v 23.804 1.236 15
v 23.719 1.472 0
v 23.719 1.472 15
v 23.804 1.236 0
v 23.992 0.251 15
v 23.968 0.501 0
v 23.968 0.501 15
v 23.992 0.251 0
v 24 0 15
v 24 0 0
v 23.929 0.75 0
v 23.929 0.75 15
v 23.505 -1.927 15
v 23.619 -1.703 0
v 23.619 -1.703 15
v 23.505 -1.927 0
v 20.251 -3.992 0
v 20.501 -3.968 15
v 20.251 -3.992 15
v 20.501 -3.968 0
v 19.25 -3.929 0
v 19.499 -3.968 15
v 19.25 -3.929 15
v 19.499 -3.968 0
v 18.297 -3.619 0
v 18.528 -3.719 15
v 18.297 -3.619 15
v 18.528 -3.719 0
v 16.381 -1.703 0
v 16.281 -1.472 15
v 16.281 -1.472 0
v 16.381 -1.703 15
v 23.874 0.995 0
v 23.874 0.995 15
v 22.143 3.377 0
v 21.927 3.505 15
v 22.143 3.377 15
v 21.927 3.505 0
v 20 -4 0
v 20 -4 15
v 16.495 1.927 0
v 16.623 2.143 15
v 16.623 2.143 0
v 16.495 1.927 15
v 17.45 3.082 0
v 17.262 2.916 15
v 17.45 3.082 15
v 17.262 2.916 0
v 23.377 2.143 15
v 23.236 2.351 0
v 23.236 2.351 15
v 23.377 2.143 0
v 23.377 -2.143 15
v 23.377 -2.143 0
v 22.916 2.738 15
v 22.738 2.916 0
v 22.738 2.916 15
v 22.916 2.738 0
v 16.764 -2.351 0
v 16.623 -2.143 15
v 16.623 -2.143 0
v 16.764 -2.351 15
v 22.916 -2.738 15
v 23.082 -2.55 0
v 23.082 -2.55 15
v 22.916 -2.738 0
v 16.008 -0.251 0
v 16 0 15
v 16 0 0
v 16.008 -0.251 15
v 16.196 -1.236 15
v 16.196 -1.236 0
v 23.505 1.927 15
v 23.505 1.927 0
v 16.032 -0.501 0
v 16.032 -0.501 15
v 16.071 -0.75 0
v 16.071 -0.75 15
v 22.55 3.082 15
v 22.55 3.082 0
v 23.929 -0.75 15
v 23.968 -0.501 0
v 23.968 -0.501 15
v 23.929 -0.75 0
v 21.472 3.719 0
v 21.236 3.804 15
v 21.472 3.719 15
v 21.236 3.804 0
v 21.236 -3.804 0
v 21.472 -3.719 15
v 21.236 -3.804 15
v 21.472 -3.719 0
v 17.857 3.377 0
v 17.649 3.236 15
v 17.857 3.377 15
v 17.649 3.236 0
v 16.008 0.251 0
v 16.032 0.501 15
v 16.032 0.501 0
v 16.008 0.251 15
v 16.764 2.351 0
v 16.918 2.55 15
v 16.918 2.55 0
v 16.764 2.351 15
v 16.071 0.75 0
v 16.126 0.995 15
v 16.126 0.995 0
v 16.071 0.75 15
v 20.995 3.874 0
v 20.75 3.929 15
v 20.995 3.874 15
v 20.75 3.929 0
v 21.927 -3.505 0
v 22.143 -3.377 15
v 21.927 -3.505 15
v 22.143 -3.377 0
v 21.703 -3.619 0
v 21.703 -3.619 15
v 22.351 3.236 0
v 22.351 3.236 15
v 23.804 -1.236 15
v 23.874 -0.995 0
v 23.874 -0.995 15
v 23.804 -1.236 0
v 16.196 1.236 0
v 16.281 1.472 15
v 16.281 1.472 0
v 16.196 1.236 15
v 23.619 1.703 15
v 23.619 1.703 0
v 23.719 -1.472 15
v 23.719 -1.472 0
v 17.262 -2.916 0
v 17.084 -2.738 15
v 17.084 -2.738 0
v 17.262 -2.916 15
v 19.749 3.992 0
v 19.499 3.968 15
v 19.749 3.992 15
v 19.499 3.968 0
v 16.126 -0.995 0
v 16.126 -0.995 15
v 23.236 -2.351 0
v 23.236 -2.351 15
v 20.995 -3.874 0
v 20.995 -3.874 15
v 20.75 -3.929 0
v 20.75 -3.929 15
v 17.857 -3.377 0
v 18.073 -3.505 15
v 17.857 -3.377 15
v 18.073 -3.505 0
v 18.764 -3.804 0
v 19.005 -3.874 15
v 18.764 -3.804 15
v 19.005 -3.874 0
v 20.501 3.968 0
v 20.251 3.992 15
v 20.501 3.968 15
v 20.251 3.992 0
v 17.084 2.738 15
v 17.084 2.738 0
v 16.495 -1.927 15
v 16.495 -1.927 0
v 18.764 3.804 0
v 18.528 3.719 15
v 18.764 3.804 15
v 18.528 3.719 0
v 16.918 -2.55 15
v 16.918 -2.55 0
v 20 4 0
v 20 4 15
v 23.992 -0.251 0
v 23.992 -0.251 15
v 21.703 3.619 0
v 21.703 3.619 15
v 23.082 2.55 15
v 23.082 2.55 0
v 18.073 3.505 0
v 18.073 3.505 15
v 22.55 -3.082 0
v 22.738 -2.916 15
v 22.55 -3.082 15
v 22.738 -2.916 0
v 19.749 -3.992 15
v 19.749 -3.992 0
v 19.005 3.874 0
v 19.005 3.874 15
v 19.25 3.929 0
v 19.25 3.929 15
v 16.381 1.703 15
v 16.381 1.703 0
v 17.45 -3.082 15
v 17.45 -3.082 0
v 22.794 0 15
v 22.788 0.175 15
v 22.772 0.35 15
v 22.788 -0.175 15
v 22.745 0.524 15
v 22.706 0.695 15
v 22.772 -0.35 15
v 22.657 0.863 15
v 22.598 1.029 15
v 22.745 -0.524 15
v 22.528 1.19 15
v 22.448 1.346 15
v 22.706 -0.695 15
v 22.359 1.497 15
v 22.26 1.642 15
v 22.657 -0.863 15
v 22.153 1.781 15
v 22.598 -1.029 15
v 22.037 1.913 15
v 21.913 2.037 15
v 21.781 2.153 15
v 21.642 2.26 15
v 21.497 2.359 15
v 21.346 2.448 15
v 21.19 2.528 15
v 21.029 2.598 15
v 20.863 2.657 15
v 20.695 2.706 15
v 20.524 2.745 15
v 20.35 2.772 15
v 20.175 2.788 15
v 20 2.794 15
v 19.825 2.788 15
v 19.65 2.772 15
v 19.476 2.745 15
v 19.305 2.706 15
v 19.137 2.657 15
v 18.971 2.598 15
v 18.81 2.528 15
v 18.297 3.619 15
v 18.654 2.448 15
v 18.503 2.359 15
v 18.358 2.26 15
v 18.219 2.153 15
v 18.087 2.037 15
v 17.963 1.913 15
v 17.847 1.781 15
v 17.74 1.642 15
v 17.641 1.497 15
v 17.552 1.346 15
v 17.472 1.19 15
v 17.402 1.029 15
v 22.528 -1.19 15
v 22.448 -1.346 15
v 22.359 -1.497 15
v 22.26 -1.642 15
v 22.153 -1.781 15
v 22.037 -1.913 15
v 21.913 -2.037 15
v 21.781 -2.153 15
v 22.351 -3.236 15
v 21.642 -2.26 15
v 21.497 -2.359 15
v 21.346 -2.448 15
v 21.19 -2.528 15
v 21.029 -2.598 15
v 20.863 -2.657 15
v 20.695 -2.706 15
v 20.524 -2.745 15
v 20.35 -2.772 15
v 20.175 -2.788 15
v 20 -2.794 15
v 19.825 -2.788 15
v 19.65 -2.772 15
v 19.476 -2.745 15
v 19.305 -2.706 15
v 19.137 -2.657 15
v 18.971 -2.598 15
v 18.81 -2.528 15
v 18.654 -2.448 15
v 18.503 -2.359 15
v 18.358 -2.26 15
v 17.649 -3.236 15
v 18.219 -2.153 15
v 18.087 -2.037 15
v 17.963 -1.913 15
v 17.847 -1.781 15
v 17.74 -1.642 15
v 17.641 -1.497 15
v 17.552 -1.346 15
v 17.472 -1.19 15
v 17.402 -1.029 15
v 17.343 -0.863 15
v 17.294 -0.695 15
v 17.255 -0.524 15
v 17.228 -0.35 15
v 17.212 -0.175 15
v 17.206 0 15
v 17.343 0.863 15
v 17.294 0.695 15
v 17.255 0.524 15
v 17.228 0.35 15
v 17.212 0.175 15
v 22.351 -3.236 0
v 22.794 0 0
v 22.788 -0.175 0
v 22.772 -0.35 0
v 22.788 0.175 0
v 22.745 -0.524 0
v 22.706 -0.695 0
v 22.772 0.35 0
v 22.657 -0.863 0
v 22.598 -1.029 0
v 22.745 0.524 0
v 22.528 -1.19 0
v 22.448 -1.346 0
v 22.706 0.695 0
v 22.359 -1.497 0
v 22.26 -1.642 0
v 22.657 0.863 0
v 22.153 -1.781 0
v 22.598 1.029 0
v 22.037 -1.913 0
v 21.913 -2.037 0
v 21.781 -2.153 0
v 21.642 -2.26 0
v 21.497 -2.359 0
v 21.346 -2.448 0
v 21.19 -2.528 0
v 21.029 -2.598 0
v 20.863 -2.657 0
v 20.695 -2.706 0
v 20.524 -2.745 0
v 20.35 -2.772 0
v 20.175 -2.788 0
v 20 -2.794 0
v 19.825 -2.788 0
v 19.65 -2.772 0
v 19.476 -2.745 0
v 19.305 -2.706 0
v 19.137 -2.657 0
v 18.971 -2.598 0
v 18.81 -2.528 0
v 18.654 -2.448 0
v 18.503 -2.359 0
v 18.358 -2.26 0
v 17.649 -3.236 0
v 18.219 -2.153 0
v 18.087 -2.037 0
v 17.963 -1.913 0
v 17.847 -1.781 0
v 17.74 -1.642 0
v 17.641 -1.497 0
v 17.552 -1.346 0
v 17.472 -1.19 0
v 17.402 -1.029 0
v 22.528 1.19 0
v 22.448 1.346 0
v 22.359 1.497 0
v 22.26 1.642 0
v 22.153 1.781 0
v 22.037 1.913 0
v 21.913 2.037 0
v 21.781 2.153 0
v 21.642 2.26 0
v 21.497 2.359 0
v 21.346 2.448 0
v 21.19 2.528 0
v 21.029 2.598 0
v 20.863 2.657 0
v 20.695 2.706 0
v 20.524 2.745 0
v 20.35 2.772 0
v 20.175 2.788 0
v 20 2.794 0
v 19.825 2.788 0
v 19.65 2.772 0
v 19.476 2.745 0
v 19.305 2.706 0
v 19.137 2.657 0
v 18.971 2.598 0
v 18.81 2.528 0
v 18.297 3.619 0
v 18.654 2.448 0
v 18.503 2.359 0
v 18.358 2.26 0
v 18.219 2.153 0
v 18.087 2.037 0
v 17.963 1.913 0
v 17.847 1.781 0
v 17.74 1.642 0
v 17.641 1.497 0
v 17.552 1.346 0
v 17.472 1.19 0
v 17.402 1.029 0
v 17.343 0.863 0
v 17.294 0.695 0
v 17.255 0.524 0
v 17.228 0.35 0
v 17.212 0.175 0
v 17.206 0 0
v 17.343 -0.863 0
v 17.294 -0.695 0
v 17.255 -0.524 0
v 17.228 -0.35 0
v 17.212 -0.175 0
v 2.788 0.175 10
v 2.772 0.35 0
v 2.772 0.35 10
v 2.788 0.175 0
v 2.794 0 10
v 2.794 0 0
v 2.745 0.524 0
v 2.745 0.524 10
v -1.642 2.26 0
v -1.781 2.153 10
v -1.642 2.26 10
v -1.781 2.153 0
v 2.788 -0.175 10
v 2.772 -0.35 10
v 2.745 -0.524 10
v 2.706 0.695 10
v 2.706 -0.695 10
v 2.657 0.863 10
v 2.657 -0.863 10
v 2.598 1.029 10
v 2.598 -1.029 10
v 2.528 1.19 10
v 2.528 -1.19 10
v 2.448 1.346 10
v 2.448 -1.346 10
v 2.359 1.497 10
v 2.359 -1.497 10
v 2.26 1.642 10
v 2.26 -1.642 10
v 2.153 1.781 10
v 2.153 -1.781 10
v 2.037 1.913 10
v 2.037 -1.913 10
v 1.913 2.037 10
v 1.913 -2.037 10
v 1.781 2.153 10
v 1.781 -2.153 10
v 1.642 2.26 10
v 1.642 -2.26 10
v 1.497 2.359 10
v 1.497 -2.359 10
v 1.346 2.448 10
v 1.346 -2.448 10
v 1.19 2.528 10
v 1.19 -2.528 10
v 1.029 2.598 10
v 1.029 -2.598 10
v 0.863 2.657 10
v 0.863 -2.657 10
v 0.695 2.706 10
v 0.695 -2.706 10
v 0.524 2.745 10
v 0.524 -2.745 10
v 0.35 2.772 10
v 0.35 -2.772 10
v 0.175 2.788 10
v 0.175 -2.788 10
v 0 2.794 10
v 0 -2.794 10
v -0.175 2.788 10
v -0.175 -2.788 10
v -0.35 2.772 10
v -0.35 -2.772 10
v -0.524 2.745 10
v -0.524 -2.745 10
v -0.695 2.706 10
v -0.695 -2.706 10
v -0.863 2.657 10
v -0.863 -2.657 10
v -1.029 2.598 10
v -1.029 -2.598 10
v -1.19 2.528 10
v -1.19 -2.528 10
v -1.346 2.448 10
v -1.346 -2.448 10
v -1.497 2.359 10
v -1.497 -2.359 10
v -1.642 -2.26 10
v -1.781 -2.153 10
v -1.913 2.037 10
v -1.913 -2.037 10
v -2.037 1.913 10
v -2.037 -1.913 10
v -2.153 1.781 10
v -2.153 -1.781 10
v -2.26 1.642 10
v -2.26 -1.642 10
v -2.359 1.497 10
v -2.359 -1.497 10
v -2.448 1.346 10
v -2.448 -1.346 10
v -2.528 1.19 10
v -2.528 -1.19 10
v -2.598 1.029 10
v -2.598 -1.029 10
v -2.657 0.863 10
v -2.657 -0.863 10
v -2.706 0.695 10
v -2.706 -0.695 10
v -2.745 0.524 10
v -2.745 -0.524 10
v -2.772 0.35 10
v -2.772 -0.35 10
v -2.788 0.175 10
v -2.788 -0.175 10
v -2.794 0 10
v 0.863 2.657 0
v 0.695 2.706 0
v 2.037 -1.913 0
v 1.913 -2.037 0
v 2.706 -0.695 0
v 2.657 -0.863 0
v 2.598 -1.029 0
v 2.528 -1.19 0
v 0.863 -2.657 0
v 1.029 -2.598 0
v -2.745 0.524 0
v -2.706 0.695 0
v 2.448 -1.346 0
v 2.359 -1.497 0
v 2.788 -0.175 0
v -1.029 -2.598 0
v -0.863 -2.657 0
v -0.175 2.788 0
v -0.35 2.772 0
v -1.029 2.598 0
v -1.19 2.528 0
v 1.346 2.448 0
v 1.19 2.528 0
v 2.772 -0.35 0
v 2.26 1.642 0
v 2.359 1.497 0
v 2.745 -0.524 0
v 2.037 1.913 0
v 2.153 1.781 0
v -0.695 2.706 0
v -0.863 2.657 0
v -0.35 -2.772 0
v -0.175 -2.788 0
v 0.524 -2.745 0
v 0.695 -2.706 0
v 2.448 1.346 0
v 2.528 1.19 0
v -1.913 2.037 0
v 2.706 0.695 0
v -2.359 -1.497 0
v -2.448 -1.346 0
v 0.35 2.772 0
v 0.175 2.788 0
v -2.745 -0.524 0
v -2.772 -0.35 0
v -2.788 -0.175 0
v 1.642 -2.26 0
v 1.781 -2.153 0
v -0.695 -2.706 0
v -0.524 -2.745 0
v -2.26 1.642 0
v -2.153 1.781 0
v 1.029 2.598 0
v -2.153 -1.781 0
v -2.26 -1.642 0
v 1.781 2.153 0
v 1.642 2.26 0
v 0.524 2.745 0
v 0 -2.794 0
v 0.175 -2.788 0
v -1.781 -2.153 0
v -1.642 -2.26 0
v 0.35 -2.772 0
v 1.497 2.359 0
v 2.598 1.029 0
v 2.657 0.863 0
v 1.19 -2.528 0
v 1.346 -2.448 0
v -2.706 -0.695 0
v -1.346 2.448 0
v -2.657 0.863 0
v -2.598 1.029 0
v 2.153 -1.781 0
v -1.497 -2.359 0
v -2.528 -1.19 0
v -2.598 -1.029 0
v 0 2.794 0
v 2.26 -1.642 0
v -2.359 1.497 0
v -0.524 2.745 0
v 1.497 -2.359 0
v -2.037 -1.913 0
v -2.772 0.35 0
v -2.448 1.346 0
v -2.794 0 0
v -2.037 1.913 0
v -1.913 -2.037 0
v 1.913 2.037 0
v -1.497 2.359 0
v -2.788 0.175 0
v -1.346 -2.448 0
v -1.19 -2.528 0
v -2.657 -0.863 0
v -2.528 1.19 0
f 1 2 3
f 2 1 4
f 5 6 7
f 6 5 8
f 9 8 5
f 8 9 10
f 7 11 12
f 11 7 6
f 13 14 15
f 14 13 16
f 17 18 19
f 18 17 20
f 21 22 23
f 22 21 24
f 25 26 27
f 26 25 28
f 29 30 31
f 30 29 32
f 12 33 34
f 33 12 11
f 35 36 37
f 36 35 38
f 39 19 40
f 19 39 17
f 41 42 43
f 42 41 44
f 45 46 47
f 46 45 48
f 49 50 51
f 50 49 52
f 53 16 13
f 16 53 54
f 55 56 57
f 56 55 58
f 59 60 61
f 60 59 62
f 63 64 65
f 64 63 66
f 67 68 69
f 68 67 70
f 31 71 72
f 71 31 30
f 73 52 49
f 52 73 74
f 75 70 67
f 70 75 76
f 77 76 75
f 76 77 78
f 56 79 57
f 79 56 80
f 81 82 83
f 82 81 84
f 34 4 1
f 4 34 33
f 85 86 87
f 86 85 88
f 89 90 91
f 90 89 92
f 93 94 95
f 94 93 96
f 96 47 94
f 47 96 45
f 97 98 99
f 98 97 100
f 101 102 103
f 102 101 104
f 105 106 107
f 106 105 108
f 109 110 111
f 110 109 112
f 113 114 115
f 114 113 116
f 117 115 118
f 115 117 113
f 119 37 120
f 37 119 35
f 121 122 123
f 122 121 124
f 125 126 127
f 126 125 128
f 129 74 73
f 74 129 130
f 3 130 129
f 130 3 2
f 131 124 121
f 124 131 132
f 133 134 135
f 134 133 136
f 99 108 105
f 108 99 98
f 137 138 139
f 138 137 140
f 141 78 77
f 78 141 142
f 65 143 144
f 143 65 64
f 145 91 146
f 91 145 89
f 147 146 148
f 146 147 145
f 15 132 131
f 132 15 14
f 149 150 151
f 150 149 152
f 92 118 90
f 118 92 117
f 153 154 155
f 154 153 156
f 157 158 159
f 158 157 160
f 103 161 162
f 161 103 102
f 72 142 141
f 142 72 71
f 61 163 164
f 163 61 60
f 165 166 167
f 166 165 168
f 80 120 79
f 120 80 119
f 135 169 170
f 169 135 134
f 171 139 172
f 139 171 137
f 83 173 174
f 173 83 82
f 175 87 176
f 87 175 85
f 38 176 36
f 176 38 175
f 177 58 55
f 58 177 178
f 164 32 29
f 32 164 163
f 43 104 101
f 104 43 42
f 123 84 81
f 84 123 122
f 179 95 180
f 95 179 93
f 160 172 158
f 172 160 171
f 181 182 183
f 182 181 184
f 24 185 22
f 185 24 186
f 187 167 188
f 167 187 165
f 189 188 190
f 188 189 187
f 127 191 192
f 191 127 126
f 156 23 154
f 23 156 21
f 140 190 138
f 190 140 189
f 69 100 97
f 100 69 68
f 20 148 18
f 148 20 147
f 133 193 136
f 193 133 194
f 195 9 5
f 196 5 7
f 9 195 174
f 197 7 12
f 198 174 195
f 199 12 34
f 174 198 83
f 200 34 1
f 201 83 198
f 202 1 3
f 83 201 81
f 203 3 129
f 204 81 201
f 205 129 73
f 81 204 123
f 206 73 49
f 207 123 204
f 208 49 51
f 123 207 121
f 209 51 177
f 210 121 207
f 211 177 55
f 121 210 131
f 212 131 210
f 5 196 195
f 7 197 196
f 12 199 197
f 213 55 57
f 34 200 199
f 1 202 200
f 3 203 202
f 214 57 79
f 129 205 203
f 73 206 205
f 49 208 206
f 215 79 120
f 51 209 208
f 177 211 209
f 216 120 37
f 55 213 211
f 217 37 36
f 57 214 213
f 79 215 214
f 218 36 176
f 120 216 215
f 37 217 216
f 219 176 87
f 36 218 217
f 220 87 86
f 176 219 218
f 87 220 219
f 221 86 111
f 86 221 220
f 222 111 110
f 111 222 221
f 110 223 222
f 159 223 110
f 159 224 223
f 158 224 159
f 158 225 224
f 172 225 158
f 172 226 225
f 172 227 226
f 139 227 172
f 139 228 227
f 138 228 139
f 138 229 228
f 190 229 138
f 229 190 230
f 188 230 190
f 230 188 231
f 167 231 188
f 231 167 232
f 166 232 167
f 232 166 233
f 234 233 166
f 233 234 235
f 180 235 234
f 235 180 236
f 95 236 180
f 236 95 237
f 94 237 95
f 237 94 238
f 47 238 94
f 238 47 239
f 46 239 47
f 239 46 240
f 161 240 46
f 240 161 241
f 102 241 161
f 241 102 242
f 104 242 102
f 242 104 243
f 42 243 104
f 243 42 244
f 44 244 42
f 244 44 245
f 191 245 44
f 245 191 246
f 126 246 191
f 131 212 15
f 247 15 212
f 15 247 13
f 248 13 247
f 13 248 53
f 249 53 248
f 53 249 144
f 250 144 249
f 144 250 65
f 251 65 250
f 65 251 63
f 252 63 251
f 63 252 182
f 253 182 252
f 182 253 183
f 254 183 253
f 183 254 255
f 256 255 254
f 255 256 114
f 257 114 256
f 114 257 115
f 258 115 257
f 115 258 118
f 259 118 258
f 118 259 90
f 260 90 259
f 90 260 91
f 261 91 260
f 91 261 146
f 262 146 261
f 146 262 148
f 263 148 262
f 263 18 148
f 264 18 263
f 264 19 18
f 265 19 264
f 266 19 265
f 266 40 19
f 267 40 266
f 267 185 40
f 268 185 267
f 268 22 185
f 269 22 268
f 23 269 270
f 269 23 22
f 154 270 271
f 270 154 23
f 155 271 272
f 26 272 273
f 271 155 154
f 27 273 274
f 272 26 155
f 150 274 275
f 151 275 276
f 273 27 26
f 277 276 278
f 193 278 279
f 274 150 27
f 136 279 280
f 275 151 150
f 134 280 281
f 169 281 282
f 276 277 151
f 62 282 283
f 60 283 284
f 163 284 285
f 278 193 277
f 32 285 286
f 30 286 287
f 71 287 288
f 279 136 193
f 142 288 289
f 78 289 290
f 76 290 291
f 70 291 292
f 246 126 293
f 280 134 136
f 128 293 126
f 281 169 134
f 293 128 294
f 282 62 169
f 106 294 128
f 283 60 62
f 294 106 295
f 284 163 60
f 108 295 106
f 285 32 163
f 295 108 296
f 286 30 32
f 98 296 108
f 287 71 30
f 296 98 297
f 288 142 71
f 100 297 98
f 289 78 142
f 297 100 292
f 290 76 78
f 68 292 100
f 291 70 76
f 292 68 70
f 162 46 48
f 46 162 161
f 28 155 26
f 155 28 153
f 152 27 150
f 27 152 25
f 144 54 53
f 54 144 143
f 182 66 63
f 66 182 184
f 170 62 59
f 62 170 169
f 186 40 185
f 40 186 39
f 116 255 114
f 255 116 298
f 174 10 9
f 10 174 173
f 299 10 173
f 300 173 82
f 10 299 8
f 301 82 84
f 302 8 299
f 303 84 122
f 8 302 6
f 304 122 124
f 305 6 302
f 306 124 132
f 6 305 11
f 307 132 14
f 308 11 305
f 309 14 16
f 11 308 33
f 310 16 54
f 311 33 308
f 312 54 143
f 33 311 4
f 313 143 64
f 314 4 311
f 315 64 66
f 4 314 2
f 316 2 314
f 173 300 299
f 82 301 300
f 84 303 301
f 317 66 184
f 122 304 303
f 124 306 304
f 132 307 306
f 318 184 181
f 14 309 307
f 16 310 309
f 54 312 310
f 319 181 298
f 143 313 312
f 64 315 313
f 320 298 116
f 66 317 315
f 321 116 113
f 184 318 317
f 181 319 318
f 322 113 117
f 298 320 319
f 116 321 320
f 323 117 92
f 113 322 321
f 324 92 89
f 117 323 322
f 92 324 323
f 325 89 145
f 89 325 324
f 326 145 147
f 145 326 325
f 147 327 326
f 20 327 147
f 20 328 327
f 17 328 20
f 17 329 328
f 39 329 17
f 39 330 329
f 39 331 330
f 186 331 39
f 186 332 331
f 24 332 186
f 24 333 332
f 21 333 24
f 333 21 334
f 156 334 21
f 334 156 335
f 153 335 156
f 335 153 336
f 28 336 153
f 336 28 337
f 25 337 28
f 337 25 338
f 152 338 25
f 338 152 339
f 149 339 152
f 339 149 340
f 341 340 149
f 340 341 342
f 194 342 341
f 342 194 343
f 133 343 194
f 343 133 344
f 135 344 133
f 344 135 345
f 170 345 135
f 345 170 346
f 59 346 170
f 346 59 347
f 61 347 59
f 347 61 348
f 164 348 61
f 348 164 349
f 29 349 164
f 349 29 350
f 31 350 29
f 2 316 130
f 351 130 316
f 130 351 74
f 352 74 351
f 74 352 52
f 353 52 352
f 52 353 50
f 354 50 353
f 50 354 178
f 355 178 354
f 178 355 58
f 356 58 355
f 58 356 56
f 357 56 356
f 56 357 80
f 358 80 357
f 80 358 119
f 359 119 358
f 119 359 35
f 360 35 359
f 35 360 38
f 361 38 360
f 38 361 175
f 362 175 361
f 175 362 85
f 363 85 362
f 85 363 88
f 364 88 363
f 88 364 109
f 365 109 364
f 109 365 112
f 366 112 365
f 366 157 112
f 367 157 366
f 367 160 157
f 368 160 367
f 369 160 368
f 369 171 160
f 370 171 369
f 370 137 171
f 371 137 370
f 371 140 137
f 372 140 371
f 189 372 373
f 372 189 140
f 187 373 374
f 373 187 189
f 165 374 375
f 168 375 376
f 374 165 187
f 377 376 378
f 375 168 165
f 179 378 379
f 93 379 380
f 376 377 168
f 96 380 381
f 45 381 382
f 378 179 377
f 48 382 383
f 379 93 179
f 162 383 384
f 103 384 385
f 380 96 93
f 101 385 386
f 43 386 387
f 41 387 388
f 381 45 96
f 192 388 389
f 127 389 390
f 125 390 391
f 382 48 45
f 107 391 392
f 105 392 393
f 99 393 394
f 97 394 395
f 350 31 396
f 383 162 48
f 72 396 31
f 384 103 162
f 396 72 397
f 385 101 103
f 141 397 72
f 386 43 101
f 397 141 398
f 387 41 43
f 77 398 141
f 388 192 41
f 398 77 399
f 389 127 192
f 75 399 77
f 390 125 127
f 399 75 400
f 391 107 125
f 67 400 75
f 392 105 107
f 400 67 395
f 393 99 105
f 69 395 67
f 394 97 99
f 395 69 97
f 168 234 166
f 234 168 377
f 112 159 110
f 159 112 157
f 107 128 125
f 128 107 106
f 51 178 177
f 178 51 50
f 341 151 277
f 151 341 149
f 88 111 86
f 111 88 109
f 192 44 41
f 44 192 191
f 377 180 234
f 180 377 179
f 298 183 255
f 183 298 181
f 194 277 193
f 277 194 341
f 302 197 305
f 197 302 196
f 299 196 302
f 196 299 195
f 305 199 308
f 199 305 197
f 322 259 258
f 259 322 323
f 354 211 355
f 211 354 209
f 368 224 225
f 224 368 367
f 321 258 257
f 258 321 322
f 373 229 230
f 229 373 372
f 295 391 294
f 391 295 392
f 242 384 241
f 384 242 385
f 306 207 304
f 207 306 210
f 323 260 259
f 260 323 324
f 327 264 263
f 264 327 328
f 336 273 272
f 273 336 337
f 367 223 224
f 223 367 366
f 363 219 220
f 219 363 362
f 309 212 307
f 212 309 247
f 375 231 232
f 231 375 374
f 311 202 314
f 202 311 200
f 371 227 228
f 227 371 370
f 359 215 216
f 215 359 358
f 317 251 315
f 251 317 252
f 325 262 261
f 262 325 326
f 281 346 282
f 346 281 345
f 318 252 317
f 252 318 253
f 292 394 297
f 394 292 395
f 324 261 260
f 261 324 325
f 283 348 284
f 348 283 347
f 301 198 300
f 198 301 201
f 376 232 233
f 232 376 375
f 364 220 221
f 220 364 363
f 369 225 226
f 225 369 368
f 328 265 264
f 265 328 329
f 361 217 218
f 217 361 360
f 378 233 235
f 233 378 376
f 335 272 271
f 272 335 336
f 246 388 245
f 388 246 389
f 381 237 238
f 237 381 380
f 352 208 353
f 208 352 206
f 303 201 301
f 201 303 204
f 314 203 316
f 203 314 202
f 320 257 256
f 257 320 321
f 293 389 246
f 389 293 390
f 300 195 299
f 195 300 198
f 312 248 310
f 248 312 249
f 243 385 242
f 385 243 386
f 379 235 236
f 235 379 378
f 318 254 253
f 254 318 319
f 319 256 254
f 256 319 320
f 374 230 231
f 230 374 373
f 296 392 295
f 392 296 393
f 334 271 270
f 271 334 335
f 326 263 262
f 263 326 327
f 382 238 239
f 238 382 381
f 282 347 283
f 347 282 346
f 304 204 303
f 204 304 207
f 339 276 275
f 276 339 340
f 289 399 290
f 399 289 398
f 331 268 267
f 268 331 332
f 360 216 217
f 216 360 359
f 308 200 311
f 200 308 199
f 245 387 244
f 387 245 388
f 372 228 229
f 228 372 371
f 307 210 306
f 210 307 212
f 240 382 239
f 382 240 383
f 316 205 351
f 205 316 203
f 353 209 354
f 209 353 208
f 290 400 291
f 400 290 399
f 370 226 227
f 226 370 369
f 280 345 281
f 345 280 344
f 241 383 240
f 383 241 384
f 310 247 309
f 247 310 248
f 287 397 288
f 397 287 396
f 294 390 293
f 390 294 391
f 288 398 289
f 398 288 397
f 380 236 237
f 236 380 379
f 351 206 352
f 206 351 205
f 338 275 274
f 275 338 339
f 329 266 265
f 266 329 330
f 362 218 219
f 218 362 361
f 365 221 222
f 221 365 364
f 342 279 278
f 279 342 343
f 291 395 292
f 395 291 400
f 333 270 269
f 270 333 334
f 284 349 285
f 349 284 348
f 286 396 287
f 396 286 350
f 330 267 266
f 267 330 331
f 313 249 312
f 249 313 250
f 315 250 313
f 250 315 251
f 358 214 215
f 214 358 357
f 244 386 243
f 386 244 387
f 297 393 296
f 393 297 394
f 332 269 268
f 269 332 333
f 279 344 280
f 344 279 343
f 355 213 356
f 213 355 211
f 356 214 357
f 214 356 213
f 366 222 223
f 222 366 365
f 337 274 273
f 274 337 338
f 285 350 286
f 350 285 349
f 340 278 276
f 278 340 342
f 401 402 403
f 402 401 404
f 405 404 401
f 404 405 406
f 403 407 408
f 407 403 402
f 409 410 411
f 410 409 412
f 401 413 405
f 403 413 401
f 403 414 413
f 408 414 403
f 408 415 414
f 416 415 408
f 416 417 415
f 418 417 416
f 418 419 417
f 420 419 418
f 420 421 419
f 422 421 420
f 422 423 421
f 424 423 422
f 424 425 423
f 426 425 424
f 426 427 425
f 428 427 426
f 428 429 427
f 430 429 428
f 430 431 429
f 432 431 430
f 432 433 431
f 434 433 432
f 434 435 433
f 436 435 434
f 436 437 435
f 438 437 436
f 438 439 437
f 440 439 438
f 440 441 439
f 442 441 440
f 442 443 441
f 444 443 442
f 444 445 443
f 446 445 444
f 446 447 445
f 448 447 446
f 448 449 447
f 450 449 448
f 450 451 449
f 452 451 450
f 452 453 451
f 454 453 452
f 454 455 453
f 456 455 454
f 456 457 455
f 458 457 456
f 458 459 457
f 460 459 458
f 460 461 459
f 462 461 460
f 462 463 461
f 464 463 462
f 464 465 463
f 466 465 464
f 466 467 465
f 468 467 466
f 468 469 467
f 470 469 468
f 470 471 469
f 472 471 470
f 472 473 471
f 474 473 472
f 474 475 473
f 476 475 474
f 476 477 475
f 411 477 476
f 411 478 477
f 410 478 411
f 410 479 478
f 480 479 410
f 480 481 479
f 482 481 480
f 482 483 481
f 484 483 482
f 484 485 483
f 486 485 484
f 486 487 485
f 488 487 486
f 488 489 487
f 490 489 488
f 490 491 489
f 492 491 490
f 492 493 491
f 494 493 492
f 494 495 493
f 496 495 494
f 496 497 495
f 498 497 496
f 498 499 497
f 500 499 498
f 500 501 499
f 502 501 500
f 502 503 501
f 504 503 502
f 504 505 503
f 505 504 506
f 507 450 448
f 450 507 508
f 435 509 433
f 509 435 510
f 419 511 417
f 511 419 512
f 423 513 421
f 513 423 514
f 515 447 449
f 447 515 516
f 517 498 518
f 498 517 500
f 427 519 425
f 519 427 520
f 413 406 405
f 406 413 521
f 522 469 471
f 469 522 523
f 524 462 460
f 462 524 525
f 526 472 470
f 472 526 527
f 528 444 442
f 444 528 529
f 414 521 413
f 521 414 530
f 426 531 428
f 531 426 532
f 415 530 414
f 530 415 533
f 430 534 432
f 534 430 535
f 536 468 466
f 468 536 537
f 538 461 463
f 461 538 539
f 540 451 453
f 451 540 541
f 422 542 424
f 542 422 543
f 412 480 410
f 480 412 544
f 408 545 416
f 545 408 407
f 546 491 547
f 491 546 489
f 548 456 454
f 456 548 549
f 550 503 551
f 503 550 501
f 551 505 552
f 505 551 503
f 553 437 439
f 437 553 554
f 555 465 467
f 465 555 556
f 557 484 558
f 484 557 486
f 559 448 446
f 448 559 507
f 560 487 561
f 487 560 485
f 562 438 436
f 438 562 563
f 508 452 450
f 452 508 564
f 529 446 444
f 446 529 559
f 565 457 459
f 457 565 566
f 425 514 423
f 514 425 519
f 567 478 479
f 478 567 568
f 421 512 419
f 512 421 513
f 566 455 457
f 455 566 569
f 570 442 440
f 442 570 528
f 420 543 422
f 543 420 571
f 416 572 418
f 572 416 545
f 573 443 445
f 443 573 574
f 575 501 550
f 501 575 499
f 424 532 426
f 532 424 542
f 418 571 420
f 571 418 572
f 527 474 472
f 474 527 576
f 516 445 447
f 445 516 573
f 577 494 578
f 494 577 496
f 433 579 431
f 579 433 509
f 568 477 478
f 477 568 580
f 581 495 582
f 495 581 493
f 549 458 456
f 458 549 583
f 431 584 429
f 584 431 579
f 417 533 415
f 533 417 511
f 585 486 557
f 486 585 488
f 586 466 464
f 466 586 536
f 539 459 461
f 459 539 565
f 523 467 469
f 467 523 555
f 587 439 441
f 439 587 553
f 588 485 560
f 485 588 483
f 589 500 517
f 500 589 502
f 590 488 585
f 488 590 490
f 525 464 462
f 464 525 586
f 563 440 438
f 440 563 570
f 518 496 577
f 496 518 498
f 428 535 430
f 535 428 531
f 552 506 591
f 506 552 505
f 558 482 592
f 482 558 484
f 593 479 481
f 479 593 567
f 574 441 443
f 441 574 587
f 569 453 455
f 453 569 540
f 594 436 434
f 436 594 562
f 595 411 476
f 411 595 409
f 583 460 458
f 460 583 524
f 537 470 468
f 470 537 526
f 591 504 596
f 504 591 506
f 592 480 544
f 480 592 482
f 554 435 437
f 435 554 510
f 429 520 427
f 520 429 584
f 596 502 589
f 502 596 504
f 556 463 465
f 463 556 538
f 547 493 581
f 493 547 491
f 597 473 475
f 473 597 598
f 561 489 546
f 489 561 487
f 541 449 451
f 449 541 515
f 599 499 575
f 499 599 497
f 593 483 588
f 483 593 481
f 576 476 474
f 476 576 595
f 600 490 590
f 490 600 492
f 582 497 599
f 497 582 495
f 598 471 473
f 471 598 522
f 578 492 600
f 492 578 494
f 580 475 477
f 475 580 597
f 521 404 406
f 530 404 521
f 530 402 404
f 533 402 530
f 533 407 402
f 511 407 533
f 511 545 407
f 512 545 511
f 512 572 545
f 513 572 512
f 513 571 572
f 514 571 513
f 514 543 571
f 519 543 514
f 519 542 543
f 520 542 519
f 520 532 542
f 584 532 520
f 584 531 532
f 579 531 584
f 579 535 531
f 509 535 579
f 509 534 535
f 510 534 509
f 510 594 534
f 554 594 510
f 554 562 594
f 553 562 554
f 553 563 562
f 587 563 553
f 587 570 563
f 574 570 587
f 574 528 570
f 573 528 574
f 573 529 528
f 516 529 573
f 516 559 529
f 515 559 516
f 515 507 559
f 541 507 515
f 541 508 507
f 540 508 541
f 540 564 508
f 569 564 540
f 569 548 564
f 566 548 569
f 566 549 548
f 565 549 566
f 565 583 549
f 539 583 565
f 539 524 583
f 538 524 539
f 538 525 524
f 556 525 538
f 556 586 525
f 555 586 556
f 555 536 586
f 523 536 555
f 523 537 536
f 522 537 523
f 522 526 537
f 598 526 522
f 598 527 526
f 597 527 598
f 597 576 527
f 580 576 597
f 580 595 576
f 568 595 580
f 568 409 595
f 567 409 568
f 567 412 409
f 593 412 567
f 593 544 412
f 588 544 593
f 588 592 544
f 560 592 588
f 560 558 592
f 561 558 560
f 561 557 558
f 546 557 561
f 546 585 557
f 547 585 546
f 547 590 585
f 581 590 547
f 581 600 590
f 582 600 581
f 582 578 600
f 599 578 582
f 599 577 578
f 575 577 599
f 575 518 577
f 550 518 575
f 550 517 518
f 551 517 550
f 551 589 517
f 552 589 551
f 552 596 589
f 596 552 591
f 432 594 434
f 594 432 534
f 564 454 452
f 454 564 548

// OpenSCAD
$fn=100;
cylinder(r=2.794, h=10);

translate([20,0,0])
difference(){
cylinder(r=4,h=15);
cylinder(r=2.794,h=15);  
}
